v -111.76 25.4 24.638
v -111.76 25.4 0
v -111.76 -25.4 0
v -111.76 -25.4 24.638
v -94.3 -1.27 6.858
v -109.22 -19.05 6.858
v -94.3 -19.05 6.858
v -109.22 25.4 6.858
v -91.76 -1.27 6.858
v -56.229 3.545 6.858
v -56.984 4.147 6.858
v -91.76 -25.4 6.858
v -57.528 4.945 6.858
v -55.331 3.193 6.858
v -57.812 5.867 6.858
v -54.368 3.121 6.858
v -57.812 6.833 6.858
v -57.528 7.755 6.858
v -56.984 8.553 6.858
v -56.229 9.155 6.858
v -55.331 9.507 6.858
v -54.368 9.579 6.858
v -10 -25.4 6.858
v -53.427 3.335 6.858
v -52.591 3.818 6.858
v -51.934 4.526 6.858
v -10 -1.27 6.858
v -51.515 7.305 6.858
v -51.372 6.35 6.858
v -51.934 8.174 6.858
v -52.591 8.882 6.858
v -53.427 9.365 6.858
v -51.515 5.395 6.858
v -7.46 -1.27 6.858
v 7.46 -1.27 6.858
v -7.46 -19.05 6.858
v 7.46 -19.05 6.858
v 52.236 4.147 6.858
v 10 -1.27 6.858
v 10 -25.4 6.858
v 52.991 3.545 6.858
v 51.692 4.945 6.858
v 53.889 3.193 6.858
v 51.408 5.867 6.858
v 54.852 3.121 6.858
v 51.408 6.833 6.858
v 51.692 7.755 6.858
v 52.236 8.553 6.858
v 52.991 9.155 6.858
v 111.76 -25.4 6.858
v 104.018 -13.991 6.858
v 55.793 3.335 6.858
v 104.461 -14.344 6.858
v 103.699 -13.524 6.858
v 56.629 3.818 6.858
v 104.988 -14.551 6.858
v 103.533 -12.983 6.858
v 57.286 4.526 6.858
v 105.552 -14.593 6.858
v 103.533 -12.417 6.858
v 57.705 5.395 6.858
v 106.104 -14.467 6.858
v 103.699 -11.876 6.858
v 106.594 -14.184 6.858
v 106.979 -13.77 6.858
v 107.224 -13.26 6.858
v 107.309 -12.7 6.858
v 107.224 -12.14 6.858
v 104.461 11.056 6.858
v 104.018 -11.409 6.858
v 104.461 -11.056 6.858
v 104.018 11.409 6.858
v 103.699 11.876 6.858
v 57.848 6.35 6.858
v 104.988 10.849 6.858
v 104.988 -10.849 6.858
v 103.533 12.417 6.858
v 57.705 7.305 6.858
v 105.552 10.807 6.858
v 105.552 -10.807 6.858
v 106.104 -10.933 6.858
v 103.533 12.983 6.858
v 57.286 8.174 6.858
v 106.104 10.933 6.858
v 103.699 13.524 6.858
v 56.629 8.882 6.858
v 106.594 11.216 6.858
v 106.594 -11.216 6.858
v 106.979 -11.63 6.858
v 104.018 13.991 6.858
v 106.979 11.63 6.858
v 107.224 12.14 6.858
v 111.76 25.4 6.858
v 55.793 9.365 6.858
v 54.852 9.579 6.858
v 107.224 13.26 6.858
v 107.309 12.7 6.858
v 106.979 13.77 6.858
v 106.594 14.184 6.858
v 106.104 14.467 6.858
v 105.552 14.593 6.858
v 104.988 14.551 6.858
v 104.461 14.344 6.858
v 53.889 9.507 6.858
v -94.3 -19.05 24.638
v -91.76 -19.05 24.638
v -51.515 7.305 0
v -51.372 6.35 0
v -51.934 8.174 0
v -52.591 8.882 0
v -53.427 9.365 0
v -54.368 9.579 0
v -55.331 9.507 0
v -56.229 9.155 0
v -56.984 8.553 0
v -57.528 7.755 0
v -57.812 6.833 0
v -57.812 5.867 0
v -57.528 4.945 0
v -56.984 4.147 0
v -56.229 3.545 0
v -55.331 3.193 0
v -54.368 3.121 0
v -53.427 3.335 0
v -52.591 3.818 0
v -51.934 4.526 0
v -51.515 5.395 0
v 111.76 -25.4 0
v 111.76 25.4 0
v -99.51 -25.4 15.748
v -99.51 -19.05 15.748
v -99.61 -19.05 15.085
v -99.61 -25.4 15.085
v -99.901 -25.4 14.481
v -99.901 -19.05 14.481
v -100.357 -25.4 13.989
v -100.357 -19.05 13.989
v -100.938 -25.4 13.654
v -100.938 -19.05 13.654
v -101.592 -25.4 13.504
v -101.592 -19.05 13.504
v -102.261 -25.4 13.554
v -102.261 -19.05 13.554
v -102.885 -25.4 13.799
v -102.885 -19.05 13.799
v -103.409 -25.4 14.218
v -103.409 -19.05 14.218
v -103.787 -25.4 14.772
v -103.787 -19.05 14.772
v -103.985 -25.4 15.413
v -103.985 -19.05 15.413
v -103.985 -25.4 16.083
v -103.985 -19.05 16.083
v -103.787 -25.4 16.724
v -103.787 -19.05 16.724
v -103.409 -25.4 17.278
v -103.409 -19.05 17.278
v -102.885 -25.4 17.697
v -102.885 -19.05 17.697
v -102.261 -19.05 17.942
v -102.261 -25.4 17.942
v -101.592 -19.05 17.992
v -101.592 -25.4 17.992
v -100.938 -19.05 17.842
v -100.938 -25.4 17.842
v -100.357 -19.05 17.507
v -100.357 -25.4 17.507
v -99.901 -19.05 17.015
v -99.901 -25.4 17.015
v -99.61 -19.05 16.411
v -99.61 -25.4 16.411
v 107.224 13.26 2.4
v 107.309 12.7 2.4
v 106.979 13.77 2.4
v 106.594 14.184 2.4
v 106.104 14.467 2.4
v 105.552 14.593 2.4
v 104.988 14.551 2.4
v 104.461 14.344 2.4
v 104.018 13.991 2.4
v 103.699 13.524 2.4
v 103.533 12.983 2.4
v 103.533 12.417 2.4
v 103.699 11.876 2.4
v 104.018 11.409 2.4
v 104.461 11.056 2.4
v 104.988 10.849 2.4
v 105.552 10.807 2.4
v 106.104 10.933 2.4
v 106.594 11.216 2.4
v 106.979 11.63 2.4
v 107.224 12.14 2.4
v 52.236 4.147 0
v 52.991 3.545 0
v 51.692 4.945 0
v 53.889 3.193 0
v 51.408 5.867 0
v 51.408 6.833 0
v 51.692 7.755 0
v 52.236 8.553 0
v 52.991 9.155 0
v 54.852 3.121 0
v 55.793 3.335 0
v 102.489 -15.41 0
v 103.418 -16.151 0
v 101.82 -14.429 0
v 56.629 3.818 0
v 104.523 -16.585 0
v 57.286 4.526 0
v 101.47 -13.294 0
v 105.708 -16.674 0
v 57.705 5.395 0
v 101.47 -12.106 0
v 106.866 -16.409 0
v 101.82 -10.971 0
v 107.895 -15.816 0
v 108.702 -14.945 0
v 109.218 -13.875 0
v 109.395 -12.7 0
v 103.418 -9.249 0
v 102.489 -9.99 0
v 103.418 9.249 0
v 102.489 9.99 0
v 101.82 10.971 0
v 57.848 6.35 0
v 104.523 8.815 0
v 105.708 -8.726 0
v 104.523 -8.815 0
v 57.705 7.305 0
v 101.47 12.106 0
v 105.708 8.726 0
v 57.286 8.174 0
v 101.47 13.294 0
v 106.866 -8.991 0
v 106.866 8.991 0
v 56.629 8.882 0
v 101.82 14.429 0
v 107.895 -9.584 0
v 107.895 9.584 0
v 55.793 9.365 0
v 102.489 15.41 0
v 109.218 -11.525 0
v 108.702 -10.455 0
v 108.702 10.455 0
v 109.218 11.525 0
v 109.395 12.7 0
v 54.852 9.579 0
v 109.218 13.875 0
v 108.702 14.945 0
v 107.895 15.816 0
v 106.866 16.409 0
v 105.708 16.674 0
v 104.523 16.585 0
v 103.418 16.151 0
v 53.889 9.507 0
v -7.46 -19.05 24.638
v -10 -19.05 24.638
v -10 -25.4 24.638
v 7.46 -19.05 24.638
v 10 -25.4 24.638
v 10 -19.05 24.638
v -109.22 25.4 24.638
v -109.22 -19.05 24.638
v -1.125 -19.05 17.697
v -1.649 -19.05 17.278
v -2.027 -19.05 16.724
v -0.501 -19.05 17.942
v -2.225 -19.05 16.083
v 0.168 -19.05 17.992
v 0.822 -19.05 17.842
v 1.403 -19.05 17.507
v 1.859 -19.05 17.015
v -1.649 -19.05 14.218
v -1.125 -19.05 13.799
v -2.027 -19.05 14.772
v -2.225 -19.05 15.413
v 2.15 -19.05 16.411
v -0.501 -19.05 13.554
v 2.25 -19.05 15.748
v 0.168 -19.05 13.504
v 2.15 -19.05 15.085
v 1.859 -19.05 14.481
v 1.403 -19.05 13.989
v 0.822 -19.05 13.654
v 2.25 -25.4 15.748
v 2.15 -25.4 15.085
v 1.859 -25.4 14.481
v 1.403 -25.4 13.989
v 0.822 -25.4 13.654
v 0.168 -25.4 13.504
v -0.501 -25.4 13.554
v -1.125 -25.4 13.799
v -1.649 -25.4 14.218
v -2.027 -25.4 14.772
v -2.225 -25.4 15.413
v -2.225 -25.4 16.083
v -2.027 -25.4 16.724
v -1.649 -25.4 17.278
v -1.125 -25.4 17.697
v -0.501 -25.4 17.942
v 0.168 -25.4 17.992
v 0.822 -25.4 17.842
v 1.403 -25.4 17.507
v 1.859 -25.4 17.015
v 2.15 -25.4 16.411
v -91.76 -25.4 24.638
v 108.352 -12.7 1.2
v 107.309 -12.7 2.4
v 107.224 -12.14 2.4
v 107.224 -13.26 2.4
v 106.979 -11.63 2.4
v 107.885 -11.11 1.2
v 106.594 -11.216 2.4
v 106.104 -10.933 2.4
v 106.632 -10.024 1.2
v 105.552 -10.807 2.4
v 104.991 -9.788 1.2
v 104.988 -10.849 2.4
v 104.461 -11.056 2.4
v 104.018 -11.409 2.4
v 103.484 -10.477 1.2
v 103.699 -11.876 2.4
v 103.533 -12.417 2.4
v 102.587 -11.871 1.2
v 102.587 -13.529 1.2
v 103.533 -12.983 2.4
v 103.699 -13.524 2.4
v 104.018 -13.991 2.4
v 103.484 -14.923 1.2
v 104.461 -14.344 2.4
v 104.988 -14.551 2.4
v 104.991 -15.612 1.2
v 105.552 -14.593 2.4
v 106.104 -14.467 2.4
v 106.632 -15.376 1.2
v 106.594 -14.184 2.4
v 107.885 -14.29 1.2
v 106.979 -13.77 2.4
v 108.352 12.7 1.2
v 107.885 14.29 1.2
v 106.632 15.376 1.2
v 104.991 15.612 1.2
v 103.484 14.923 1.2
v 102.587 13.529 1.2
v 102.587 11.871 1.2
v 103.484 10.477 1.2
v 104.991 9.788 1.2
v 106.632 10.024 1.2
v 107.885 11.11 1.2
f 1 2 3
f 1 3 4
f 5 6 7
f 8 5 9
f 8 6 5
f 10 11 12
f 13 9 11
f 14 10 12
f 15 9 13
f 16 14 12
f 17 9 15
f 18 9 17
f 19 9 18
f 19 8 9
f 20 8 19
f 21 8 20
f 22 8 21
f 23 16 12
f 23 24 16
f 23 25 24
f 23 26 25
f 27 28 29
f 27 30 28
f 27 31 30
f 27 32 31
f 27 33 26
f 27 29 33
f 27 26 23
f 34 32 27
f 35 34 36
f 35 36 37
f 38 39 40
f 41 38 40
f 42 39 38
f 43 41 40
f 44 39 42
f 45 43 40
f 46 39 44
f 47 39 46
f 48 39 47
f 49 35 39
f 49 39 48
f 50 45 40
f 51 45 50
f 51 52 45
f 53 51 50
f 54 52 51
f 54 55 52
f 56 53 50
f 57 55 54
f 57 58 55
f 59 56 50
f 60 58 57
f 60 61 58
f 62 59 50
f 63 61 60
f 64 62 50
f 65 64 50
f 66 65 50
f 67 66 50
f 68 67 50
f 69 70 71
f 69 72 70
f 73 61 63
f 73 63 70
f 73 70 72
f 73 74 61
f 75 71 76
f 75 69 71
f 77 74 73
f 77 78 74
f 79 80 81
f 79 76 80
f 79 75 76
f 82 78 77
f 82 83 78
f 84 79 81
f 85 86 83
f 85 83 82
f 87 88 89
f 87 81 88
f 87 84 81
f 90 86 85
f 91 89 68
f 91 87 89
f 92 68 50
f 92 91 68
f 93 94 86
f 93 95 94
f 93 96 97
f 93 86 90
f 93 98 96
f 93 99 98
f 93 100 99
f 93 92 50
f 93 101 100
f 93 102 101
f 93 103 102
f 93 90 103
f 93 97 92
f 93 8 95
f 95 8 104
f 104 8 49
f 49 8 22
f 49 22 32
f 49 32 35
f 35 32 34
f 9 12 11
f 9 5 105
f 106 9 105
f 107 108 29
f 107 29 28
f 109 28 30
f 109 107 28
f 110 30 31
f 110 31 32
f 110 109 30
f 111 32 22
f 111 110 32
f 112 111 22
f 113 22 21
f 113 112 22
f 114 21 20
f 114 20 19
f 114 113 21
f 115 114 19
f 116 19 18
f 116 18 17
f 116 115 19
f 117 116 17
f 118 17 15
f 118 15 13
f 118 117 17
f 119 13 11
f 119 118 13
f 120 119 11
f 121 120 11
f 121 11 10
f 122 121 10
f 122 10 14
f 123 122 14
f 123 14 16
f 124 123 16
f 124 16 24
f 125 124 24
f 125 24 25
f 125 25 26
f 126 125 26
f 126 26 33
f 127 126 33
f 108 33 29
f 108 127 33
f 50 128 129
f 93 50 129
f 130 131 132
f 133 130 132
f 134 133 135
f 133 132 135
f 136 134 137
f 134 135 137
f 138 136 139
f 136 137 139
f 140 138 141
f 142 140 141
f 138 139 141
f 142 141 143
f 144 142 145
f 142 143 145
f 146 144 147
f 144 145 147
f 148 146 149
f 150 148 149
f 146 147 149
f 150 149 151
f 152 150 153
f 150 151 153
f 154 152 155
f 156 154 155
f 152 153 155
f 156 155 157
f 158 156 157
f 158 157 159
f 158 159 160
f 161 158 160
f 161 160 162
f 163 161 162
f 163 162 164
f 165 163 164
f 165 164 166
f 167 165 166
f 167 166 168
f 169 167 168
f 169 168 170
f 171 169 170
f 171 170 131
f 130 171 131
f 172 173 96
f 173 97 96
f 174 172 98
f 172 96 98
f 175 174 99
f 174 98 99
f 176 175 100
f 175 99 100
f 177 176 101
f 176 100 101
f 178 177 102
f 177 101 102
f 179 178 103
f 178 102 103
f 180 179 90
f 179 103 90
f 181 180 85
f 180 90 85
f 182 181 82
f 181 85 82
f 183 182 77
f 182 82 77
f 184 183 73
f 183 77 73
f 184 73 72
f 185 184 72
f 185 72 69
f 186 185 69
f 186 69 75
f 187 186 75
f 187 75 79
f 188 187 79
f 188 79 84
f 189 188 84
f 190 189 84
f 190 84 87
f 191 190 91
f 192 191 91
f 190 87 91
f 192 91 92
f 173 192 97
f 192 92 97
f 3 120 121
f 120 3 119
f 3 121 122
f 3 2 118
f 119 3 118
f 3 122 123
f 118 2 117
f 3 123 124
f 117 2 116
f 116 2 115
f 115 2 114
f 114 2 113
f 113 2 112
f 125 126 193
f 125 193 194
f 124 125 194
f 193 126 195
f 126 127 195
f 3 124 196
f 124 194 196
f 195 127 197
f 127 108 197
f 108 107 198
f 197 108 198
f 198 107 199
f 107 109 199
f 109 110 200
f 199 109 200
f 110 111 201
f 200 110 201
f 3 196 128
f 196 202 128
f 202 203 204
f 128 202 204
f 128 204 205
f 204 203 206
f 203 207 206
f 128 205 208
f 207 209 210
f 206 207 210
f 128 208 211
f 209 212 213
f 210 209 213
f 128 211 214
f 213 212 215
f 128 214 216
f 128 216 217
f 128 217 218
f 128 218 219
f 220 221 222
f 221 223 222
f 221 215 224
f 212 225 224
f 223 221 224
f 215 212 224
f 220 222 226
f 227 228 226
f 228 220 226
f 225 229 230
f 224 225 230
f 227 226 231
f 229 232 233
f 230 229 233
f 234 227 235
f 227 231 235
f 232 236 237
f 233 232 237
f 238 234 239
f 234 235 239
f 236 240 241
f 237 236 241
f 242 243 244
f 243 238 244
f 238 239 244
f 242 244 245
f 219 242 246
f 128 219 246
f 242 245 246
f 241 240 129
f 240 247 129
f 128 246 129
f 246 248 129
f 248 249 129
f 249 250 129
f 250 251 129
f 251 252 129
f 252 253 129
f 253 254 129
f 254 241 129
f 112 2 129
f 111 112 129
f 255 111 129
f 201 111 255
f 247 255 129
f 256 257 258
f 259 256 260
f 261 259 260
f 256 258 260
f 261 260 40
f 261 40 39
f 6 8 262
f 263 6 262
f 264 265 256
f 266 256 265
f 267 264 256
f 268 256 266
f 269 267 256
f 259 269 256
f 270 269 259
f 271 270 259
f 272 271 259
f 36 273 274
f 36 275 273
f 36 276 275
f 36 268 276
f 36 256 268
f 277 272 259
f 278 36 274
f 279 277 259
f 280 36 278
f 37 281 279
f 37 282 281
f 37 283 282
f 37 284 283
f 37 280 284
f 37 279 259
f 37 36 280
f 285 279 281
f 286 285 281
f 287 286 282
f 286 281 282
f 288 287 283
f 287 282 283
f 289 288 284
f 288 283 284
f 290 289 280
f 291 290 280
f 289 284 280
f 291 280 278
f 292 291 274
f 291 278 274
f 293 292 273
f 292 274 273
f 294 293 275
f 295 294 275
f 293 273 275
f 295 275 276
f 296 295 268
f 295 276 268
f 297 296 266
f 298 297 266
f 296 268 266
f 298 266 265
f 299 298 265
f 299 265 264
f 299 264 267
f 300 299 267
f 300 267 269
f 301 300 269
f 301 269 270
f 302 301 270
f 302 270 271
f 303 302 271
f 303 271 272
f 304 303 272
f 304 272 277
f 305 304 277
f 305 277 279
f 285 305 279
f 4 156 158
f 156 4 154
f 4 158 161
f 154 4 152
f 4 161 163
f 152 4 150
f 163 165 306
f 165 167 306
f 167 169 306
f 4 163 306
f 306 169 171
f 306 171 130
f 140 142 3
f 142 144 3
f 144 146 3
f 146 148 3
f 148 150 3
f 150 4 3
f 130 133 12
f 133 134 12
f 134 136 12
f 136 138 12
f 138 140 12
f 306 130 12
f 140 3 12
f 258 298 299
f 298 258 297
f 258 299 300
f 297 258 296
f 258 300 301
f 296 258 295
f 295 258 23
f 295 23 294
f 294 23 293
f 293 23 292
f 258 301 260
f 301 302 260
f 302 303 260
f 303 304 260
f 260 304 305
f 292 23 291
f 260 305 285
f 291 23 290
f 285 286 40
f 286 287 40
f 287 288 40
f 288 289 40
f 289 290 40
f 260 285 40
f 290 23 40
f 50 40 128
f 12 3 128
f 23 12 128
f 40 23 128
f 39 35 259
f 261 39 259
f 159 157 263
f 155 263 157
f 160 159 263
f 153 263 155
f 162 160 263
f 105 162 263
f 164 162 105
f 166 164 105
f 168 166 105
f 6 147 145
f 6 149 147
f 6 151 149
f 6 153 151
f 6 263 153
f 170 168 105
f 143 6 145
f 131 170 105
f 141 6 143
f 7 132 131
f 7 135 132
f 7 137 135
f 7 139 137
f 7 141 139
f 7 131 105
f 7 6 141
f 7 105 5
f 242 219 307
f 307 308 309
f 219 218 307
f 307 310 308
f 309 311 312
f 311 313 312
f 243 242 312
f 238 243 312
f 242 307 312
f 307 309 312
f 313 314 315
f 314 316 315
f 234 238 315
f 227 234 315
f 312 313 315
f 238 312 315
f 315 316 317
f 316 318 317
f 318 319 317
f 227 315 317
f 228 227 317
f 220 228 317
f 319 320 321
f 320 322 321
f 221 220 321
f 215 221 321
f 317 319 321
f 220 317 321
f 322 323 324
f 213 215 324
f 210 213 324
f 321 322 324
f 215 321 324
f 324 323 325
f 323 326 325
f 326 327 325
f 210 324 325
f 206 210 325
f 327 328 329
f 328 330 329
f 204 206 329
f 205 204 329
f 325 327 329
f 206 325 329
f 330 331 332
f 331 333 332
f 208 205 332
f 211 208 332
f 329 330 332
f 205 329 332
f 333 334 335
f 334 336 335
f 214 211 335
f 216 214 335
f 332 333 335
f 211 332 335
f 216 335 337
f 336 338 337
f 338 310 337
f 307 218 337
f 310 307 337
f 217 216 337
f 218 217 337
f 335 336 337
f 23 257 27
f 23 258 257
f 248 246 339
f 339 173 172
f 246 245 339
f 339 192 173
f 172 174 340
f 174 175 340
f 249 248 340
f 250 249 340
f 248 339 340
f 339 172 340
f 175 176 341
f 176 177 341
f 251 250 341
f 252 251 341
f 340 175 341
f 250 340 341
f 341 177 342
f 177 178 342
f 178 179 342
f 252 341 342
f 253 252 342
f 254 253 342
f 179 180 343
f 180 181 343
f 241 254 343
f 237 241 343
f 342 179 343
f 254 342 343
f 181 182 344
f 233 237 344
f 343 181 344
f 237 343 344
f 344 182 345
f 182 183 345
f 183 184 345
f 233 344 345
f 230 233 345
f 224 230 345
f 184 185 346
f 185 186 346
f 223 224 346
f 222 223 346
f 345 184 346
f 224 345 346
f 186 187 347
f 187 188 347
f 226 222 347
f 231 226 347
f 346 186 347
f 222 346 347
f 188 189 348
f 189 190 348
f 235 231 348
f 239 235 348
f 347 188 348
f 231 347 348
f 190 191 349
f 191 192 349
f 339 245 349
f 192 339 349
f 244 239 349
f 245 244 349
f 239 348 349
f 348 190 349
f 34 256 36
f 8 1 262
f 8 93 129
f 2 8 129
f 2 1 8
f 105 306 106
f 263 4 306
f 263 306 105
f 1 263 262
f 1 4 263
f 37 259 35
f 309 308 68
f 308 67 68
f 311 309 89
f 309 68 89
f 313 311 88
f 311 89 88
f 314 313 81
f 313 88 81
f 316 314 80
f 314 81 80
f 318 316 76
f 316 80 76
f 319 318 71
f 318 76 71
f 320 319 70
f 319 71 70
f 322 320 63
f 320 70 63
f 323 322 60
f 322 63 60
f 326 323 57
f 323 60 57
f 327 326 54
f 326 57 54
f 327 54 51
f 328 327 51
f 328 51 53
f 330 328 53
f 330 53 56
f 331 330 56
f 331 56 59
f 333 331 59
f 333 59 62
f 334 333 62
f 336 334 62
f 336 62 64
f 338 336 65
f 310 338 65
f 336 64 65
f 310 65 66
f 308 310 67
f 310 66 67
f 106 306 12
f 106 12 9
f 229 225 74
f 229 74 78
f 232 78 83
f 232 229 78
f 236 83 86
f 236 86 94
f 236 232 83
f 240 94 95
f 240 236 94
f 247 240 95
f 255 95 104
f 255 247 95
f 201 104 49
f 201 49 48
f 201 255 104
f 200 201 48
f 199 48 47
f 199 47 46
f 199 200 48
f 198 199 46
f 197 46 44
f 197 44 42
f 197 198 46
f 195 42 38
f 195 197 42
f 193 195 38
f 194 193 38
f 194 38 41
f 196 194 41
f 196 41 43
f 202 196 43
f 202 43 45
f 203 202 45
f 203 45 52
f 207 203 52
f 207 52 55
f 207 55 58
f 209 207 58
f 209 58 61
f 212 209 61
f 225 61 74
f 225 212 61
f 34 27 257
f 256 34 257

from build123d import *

# Parameters (mm, degrees)
SKETCH1_W                                      = 223.52
SKETCH1_H                                      = 50.8
SKETCH1_R                                      = 3.2385
BOSS_EXTRUDE1_DEPTH                            = 6.858
SKETCH2_W                                      = 20
SKETCH2_H                                      = 6.35
BOSS_EXTRUDE2_DEPTH                            = 17.78
SKETCH3_R                                      = 2.25
CUT_EXTRUDE1_DEPTH                             = 17.78
SKETCH4_W                                      = 2.54
SKETCH4_H                                      = 17.78
BOSS_EXTRUDE3_DEPTH                            = 17.78
CUT_EXTRUDE2_DEPTH                             = 20
LPATTERN1_COUNT                                = 2
LPATTERN1_PITCH                                = 101.76
BOSS_EXTRUDE4_DEPTH                            = 2.54
CSK_FOR_6_FLAT_HEAD_MACHINE_SCREW1_D           = 3.7973
CSK_FOR_6_FLAT_HEAD_MACHINE_SCREW1_CSINK_D     = 7.9697834
CSK_FOR_6_FLAT_HEAD_MACHINE_SCREW1_CSINK_ANGLE = 82


with BuildPart() as part:
    # Sketch1 → Boss-Extrude1 (new body)
    with BuildSketch(Plane.XY):
        Rectangle(SKETCH1_W, SKETCH1_H)
        with Locations((-54.61, 6.35)):
            Circle(SKETCH1_R, mode=Mode.SUBTRACT)
        with Locations((54.61, 6.35)):
            Circle(SKETCH1_R, mode=Mode.SUBTRACT)
    extrude(amount=BOSS_EXTRUDE1_DEPTH)

    # Sketch2 → Boss-Extrude2 (add)
    with BuildSketch(Plane.XY.offset(6.858)):
        with Locations((-101.76, -22.225)):
            Rectangle(SKETCH2_W, SKETCH2_H)
    boss_extrude2 = extrude(amount=BOSS_EXTRUDE2_DEPTH)

    # Sketch3 → Cut-Extrude1 (cut)
    with BuildSketch(Plane(origin=(0, -19.05, 0), x_dir=(1, 0, 0), z_dir=(0, 1, 0))):
        with Locations((-101.76, -15.748)):
            Circle(SKETCH3_R)
    cut_extrude1 = extrude(amount=-CUT_EXTRUDE1_DEPTH, mode=Mode.SUBTRACT)

    # Sketch4 → Boss-Extrude3 (add)
    with BuildSketch(Plane(origin=(0, -19.05, 0), x_dir=(1, 0, 0), z_dir=(0, 1, 0))):
        with Locations((-110.49, -15.748)):
            Rectangle(SKETCH4_W, SKETCH4_H)
        with Locations((-93.03, -15.748)):
            Rectangle(SKETCH4_W, SKETCH4_H)
    boss_extrude3 = extrude(amount=BOSS_EXTRUDE3_DEPTH)

    # Sketch6 → Cut-Extrude2 (cut)
    with BuildSketch(Plane.ZY.offset(111.76)):
        Polygon((24.638, -1.27), (6.858, -1.27), (24.638, -19.05), align=None)
    cut_extrude2 = extrude(amount=-CUT_EXTRUDE2_DEPTH, mode=Mode.SUBTRACT)

    # LPattern1: Boss-Extrude2, Cut-Extrude1, Boss-Extrude3, Cut-Extrude2 ×2
    with Locations(*[(i * LPATTERN1_PITCH, 0, 0) for i in range(1, LPATTERN1_COUNT)]):
        add(boss_extrude2)
        add(cut_extrude1, mode=Mode.SUBTRACT)
        add(boss_extrude3)
        add(cut_extrude2, mode=Mode.SUBTRACT)

    # Sketch7 → Boss-Extrude4 (add)
    with BuildSketch(Plane.ZY.offset(111.76)):
        Polygon((24.638, -19.05), (24.638, 25.4), (6.858, 25.4), (6.858, -1.27), align=None)
    extrude(amount=-BOSS_EXTRUDE4_DEPTH)

    # CSK for #6 Flat Head Machine Screw1 (through all)
    with Locations(Plane(origin=(0, 0, 0), x_dir=(-1, 0, 0), z_dir=(0, 0, -1))):
        with Locations((-105.41, 12.7), (-105.41, -12.7)):
            CounterSinkHole(CSK_FOR_6_FLAT_HEAD_MACHINE_SCREW1_D / 2, CSK_FOR_6_FLAT_HEAD_MACHINE_SCREW1_CSINK_D / 2, counter_sink_angle=CSK_FOR_6_FLAT_HEAD_MACHINE_SCREW1_CSINK_ANGLE)


solid = part.part
